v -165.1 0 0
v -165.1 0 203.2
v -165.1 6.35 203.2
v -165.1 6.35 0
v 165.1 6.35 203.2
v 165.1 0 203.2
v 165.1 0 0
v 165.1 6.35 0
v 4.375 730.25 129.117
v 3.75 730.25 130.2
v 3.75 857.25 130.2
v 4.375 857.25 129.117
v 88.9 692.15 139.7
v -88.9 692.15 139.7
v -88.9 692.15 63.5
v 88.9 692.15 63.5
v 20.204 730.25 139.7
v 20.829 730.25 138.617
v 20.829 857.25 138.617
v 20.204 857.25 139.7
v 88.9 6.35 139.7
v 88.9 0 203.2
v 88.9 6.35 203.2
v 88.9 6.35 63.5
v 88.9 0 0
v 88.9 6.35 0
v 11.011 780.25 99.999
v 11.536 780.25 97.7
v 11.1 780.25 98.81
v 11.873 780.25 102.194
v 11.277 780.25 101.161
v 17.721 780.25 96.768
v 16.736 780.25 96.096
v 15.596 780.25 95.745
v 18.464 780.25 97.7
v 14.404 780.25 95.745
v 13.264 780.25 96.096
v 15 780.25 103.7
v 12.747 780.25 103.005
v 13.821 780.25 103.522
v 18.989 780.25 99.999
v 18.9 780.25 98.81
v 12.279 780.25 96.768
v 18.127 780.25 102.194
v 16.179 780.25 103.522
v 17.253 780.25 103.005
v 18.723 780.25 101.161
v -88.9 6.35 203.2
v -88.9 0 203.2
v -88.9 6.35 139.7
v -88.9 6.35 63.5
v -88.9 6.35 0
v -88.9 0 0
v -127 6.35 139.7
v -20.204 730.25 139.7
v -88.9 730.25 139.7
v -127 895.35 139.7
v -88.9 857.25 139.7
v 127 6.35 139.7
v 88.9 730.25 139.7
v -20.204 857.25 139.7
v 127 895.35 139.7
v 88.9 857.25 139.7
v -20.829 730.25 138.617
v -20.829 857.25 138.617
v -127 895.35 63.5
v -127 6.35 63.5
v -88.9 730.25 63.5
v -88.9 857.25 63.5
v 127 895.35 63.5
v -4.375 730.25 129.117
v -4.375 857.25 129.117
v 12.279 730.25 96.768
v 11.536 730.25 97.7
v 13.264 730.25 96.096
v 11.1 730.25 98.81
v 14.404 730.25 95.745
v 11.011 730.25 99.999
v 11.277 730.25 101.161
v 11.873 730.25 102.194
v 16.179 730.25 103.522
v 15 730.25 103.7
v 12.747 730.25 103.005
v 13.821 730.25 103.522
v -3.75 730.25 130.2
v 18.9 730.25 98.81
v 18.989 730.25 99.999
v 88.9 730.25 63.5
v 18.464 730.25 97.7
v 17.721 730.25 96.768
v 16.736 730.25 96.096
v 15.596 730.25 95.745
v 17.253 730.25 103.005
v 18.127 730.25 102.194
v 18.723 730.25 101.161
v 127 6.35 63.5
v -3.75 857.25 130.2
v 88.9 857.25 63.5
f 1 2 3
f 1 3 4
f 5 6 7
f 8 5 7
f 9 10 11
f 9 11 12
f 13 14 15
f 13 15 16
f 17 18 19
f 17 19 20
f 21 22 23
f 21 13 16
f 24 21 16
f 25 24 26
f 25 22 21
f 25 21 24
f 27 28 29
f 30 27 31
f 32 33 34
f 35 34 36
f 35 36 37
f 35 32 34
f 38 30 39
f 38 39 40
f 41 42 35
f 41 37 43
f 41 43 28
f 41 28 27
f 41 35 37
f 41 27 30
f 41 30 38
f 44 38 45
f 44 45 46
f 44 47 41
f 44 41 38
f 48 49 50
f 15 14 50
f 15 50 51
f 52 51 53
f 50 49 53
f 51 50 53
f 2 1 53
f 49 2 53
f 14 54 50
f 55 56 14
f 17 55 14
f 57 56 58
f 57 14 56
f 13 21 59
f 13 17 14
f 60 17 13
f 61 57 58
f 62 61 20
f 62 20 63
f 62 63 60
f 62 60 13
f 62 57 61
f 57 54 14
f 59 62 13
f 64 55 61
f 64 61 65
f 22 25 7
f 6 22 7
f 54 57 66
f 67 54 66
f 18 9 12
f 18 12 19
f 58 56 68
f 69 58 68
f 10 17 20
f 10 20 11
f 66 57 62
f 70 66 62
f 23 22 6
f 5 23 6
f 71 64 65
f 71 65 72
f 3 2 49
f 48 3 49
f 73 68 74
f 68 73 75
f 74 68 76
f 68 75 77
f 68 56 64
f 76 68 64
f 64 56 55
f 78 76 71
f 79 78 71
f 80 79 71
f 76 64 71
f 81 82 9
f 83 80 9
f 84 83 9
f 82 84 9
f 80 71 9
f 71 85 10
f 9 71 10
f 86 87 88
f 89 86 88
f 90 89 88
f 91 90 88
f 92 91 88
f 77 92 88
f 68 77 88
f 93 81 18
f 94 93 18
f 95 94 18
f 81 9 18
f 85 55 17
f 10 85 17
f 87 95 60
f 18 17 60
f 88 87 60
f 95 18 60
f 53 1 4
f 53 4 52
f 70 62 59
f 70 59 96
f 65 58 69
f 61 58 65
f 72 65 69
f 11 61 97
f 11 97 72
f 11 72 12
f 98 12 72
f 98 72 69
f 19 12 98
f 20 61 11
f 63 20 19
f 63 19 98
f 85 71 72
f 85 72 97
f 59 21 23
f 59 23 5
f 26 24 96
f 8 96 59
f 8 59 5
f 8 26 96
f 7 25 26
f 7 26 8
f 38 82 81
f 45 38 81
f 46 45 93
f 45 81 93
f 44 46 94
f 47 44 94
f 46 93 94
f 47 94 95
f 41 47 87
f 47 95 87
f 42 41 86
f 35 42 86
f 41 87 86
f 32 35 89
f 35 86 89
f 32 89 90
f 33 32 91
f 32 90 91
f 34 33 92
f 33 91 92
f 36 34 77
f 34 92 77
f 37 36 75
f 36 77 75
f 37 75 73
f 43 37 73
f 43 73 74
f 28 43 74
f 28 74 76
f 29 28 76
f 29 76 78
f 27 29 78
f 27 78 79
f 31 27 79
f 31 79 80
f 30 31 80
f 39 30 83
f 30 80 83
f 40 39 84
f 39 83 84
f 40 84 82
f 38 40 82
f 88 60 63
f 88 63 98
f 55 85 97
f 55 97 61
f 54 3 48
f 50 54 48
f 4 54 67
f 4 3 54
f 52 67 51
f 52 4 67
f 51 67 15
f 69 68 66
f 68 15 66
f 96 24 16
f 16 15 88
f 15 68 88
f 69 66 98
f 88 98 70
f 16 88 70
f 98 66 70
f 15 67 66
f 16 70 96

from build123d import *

# Parameters (mm, degrees)
SKETCH1_W             = 76.2
SKETCH1_H             = 203.2
BOSS_EXTRUDE1_DEPTH   = 6.35
BOSS_EXTRUDE1_2_DEPTH = 6.35
SKETCH2_W             = 38.1
SKETCH2_H             = 76.2
BOSS_EXTRUDE2_DEPTH   = 889
SKETCH3_W             = 177.8
SKETCH3_H             = 38.1
BOSS_EXTRUDE3_DEPTH   = 76.2
BOSS_EXTRUDE4_REACH   = 777.766
SKETCH7_R             = 4
BOSS_EXTRUDE5_DEPTH   = 50


with BuildPart() as part:
    # Sketch1 → Boss-Extrude1 (new body)
    with BuildSketch(Plane(origin=(0, 0, 0), x_dir=(1, 0, 0), z_dir=(0, 1, 0))):
        with Locations((127, -101.6)):
            Rectangle(SKETCH1_W, SKETCH1_H)
    extrude(amount=BOSS_EXTRUDE1_DEPTH)



with BuildPart() as body_2:
    # Sketch1 → Boss-Extrude1 2 (new body)
    with BuildSketch(Plane(origin=(0, 0, 0), x_dir=(1, 0, 0), z_dir=(0, 1, 0))):
        with Locations((-127, -101.6)):
            Rectangle(SKETCH1_W, SKETCH1_H)
    extrude(amount=BOSS_EXTRUDE1_2_DEPTH)


with BuildPart() as part_1:
    add(part.part)

    add(body_2.part)  # Boss-Extrude2 merges body 2
    # Sketch2 → Boss-Extrude2 (add)
    with BuildSketch(Plane(origin=(0, 6.35, 0), x_dir=(1, 0, 0), z_dir=(0, 1, 0))):
        with Locations((-107.95, -101.6)):
            Rectangle(SKETCH2_W, SKETCH2_H)
        with Locations((107.95, -101.6)):
            Rectangle(SKETCH2_W, SKETCH2_H)
    extrude(amount=BOSS_EXTRUDE2_DEPTH)

    # Sketch3 → Boss-Extrude3 (add)
    with BuildSketch(Plane.XY.offset(139.7)):
        with Locations((0, 876.3)):
            Rectangle(SKETCH3_W, SKETCH3_H)
        with Locations((0, 711.2)):
            Rectangle(SKETCH3_W, SKETCH3_H)
    extrude(amount=-BOSS_EXTRUDE3_DEPTH)

    # Sketch6 → Boss-Extrude4 (add, up to next)
    with BuildSketch(Plane(origin=(0, 730.25, 0), x_dir=(1, 0, 0), z_dir=(0, 1, 0)), mode=Mode.PRIVATE) as boss_extrude4_sk1:
        Polygon((-3.75, -130.2), (-20.204482672, -139.7), (-20.829482672, -138.617468245), (-4.375, -129.117468245), align=None)
    boss_extrude4_tool1 = extrude(boss_extrude4_sk1.sketch, amount=BOSS_EXTRUDE4_REACH, mode=Mode.PRIVATE) - part_1.part
    # Sketch6 → Boss-Extrude4 (add, up to next)
    with BuildSketch(Plane(origin=(0, 730.25, 0), x_dir=(1, 0, 0), z_dir=(0, 1, 0)), mode=Mode.PRIVATE) as boss_extrude4_sk2:
        Polygon((20.829482672, -138.617468245), (20.204482672, -139.7), (3.75, -130.2), (4.375, -129.117468245), align=None)
    boss_extrude4_tool2 = extrude(boss_extrude4_sk2.sketch, amount=BOSS_EXTRUDE4_REACH, mode=Mode.PRIVATE) - part_1.part
    add(boss_extrude4_tool1.solids().sort_by_distance((-12.289741, 730.25, 134.408734))[0])
    add(boss_extrude4_tool2.solids().sort_by_distance((12.289741, 730.25, 134.408734))[0])

    # Sketch7 → Boss-Extrude5 (add)
    with BuildSketch(Plane(origin=(0, 730.25, 0), x_dir=(1, 0, 0), z_dir=(0, 1, 0))):
        with Locations(Location((15, -99.7, 0), (0, 0, 270))):
            Circle(SKETCH7_R)
    extrude(amount=BOSS_EXTRUDE5_DEPTH)


solid = part_1.part
